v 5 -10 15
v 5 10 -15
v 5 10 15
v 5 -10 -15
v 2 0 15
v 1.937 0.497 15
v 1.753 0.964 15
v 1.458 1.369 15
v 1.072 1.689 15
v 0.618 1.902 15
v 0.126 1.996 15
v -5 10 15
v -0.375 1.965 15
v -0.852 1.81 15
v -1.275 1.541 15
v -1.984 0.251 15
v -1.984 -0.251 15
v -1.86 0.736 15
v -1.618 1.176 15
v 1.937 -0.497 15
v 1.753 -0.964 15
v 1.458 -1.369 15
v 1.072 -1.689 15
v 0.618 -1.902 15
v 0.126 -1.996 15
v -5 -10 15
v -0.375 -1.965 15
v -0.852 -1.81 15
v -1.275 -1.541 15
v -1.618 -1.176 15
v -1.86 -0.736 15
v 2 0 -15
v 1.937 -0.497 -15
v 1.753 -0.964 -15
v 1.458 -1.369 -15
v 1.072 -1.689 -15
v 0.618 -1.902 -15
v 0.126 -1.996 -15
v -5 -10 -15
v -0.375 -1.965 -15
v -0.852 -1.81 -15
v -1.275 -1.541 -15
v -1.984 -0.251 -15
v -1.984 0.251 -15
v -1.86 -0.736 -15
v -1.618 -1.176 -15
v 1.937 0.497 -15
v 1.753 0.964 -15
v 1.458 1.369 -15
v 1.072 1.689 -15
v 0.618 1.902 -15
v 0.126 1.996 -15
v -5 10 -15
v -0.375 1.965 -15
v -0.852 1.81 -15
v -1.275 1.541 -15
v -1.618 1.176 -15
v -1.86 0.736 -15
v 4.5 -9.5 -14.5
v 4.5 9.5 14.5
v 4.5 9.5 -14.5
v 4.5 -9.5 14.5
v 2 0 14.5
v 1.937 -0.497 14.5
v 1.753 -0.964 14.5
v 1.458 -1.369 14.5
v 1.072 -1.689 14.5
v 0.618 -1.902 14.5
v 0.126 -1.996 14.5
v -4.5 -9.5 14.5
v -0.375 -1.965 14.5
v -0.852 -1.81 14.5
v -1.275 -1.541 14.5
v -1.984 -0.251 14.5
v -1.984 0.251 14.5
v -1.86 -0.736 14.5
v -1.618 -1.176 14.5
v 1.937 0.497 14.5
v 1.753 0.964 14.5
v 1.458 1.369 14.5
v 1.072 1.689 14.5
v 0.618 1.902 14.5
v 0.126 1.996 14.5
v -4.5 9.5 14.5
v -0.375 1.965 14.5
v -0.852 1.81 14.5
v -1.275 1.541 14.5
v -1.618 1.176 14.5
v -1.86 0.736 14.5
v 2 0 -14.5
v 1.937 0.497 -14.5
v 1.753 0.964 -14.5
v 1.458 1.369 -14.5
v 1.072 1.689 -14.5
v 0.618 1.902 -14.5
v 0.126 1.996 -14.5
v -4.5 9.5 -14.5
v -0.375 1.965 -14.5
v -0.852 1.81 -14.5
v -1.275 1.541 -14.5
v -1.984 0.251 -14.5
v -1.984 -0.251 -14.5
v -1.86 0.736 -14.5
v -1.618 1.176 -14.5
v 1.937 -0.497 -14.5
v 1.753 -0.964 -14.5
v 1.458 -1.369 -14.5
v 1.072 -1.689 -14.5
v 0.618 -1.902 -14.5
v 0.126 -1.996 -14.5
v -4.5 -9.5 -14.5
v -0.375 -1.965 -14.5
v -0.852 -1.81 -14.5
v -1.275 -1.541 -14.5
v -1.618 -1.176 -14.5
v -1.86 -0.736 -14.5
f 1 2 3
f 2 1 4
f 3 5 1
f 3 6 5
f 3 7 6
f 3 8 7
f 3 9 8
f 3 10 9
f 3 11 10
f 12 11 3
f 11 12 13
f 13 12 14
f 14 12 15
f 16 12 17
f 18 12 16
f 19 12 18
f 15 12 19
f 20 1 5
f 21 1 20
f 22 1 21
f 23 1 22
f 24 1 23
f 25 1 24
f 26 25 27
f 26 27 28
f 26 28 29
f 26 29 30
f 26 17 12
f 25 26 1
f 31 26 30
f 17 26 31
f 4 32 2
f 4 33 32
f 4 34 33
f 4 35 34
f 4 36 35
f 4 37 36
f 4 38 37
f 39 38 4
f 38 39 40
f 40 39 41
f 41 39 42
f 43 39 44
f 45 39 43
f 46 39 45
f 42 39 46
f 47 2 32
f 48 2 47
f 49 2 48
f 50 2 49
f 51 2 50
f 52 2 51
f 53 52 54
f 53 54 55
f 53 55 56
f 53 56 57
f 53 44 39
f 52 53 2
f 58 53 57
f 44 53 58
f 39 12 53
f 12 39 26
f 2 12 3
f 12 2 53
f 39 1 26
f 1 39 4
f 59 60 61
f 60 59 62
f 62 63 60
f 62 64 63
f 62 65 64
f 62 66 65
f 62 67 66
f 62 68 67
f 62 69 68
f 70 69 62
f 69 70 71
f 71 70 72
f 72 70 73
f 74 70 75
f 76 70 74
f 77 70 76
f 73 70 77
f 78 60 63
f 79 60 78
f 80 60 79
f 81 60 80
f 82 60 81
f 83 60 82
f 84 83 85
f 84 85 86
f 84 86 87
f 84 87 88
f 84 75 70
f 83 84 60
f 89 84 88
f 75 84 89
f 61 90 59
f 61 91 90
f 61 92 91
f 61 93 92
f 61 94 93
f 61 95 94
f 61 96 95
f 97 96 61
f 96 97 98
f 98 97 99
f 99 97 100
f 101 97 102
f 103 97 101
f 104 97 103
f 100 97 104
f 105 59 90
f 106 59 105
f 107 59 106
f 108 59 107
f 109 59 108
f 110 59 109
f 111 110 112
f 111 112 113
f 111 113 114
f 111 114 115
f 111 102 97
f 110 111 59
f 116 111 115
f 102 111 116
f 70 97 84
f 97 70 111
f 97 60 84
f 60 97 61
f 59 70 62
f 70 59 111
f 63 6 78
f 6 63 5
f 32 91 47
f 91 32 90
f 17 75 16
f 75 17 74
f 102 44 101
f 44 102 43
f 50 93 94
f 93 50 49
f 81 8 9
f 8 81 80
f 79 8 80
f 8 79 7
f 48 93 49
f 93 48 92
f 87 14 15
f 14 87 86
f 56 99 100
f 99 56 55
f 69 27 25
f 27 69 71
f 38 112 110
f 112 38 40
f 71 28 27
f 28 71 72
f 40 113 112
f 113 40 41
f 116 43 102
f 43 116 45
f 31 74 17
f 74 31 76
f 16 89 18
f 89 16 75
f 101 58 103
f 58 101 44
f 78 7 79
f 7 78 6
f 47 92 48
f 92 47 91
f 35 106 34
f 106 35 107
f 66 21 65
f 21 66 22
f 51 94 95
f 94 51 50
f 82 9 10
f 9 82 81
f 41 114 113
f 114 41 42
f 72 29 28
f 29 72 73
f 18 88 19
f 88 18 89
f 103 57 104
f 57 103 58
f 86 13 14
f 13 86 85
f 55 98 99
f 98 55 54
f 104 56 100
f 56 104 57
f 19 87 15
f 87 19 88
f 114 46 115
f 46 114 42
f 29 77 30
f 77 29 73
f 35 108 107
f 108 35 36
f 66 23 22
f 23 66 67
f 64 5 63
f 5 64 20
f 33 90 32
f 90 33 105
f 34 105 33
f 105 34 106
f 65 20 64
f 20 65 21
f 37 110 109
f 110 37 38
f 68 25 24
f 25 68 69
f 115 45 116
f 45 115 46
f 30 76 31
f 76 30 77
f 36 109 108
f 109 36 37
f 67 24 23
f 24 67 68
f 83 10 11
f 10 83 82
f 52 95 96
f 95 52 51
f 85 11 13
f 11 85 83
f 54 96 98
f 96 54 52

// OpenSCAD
// Try make this an integer multiple of the extruder diameter.
wall_thickness=1.0;

// Produces the basic shell, a box with the inner dimensions and a
// wall thickness added on.
module basic_box() {
  // By using center=true we avoid having to translate by the wall thickness.
  difference() {
    cube([10,20,30],center=true);
    cube([10 - wall_thickness,20 - wall_thickness,30 - wall_thickness],center=true);
  }
}

module access_hole() {
  cylinder(r=2,h=30,center=true, $fn=25);
}


// This displays the whole shell with all holes an ports, tabs, etc
module mainbox() {
  difference() {
    basic_box();
    access_hole();
  }
}

mainbox();
